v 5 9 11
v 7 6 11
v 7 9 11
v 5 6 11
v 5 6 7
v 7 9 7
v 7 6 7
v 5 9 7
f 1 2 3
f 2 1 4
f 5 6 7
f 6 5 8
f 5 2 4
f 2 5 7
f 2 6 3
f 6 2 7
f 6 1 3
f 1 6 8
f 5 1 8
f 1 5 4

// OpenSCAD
// file: ../openscad/transform.scad
// File: transform.scad
//   Lightweight, domain-independent transform convenience modules.
//
// FileSummary: Small plain-OpenSCAD move/rotate wrappers with an xf_ prefix.
//
// These helpers intentionally remain thin wrappers around native OpenSCAD
// translate() and rotate().  They improve readability without introducing a
// geometry framework dependency such as BOSL2.



// Function: xf_create()
// Synopsis: Creates a reusable position/rotation transform object.
// Arguments:
//   pos_mm = Translation vector in millimetres.
//   rot_deg = Euler rotation vector in degrees.
function xf_create(
    pos_mm = [0, 0, 0],
    rot_deg = [0, 0, 0]
) =
    assert(is_list(pos_mm) && len(pos_mm) == 3,
        "xf_create pos_mm must contain three values")
    assert(is_list(rot_deg) && len(rot_deg) == 3,
        "xf_create rot_deg must contain three values")
    object(
        kind = "pose",
        pos_mm = pos_mm,
        rot_deg = rot_deg
    );



// Function: xf_frame_create()
// Synopsis: Creates an orthogonal coordinate-frame transform object.
// Description:
//   Supply any two orthogonal destination axes. The missing third axis is
//   derived to preserve a right-handed coordinate system. Supplying all three
//   axes is allowed when they are mutually orthogonal and right-handed.
// Arguments:
//   pos_mm = Destination origin in millimetres.
//   x_axis = Destination direction of local +X.
//   y_axis = Destination direction of local +Y.
//   z_axis = Destination direction of local +Z.
function xf_frame_create(
    pos_mm = [0, 0, 0],
    x_axis = undef,
    y_axis = undef,
    z_axis = undef
) =
    assert(is_list(pos_mm) && len(pos_mm) == 3,
        "xf_frame_create pos_mm must contain three values")
    assert(_xf_defined_axis_count(x_axis, y_axis, z_axis) >= 2,
        "xf_frame_create requires at least two axes")
    assert(_xf_axis_is_valid(x_axis),
        "xf_frame_create x_axis must be undef or a non-zero vec3")
    assert(_xf_axis_is_valid(y_axis),
        "xf_frame_create y_axis must be undef or a non-zero vec3")
    assert(_xf_axis_is_valid(z_axis),
        "xf_frame_create z_axis must be undef or a non-zero vec3")
    let(
        _x = is_undef(x_axis) ? undef : _xf_unit(x_axis),
        _y = is_undef(y_axis) ? undef : _xf_unit(y_axis),
        _z = is_undef(z_axis) ? undef : _xf_unit(z_axis),
        _resolved_x =
            is_undef(_x)
                ? _xf_unit(cross(_y, _z))
                : _x,
        _resolved_y =
            is_undef(_y)
                ? _xf_unit(cross(_z, _x))
                : _y,
        _resolved_z =
            is_undef(_z)
                ? _xf_unit(cross(_x, _y))
                : _z
    )
    assert(_xf_axes_are_orthogonal(
        _resolved_x,
        _resolved_y,
        _resolved_z
    ), "xf_frame_create axes must be mutually orthogonal")
    assert(
        _xf_dot(
            _xf_unit(cross(_resolved_x, _resolved_y)),
            _resolved_z
        ) > 0.999999,
        "xf_frame_create axes must form a right-handed frame"
    )
    object(
        kind = "frame",
        pos_mm = pos_mm,
        x_axis = _resolved_x,
        y_axis = _resolved_y,
        z_axis = _resolved_z
    );


// Module: xf_frame()
// Synopsis: Remaps child geometry into an orthogonal destination frame.
module xf_frame(
    pos_mm = [0, 0, 0],
    x_axis = undef,
    y_axis = undef,
    z_axis = undef
) {
    xf_apply(
        xf_frame_create(
            pos_mm = pos_mm,
            x_axis = x_axis,
            y_axis = y_axis,
            z_axis = z_axis
        )
    )
        children();
}


// Function: xf_pos_mm()
// Synopsis: Returns the translation vector from a transform object.
function xf_pos_mm(obj) =
    obj.pos_mm;


// Function: xf_rot_deg()
// Synopsis: Returns the Euler rotation vector from a transform object.
function xf_rot_deg(obj) =
    obj.rot_deg;


// Module: xf_apply()
// Synopsis: Applies a transform object to child geometry.
// Arguments:
//   obj = Transform object created by xf_create().
module xf_apply(obj) {
    if (obj.kind == "pose")
        translate(xf_pos_mm(obj))
            rotate(xf_rot_deg(obj))
                children();
    else if (obj.kind == "frame")
        multmatrix(_xf_frame_matrix(obj))
            children();
    else
        assert(false, str("Unsupported transform kind: ", obj.kind));
}


// Module: xf_move()
// Usage:
//   xf_move([10, 0, 5])
//       children();
// Description:
//   Moves child geometry by the supplied [X, Y, Z] vector.
// Arguments:
//   v = Translation vector in millimetres.
module xf_move(v) {
    translate(v)
        children();
}


// Module: xf_xmove()
// Usage:
//   xf_xmove(10)
//       children();
// Description:
//   Moves child geometry along X.
// Arguments:
//   distance = Translation distance in millimetres.
module xf_xmove(distance) {
    translate([distance, 0, 0])
        children();
}


// Module: xf_ymove()
// Usage:
//   xf_ymove(10)
//       children();
// Description:
//   Moves child geometry along Y.
// Arguments:
//   distance = Translation distance in millimetres.
module xf_ymove(distance) {
    translate([0, distance, 0])
        children();
}


// Module: xf_zmove()
// Usage:
//   xf_zmove(10)
//       children();
// Description:
//   Moves child geometry along Z.
// Arguments:
//   distance = Translation distance in millimetres.
module xf_zmove(distance) {
    translate([0, 0, distance])
        children();
}


// Module: xf_rot()
// Usage:
//   xf_rot([90, 0, 45])
//       children();
// Description:
//   Rotates child geometry by the supplied [X, Y, Z] Euler-angle vector.
// Arguments:
//   angles = Rotation angles in degrees.
module xf_rot(angles) {
    rotate(angles)
        children();
}


// Module: xf_xrot()
// Usage:
//   xf_xrot(90)
//       children();
// Description:
//   Rotates child geometry around X.
// Arguments:
//   angle = Rotation angle in degrees.
module xf_xrot(angle) {
    rotate([angle, 0, 0])
        children();
}


// Module: xf_yrot()
// Usage:
//   xf_yrot(90)
//       children();
// Description:
//   Rotates child geometry around Y.
// Arguments:
//   angle = Rotation angle in degrees.
module xf_yrot(angle) {
    rotate([0, angle, 0])
        children();
}


// Module: xf_zrot()
// Usage:
//   xf_zrot(90)
//       children();
// Description:
//   Rotates child geometry around Z.
// Arguments:
//   angle = Rotation angle in degrees.
module xf_zrot(angle) {
    rotate([0, 0, angle])
        children();
}


function _xf_defined_axis_count(x_axis, y_axis, z_axis) =
    (is_undef(x_axis) ? 0 : 1)
    + (is_undef(y_axis) ? 0 : 1)
    + (is_undef(z_axis) ? 0 : 1);


function _xf_axis_is_valid(axis) =
    is_undef(axis)
    || (
        is_list(axis)
        && len(axis) == 3
        && _xf_norm(axis) > 0
    );


function _xf_dot(a, b) =
    a[0] * b[0]
    + a[1] * b[1]
    + a[2] * b[2];


function _xf_norm(v) =
    sqrt(_xf_dot(v, v));


function _xf_unit(v) =
    v / _xf_norm(v);


function _xf_axes_are_orthogonal(x_axis, y_axis, z_axis) =
    abs(_xf_dot(x_axis, y_axis)) < 0.000001
    && abs(_xf_dot(x_axis, z_axis)) < 0.000001
    && abs(_xf_dot(y_axis, z_axis)) < 0.000001;


function _xf_frame_matrix(obj) =
    [
        [
            obj.x_axis[0],
            obj.y_axis[0],
            obj.z_axis[0],
            obj.pos_mm[0]
        ],
        [
            obj.x_axis[1],
            obj.y_axis[1],
            obj.z_axis[1],
            obj.pos_mm[1]
        ],
        [
            obj.x_axis[2],
            obj.y_axis[2],
            obj.z_axis[2],
            obj.pos_mm[2]
        ],
        [0, 0, 0, 1]
    ];
// main file
use <../openscad/transform.scad>

test_transform = "move"; // [move,xmove,ymove,zmove,rot,xrot,yrot,zrot,object,frame,frame-object]

module fixture() {
    cube([2, 3, 4]);
}

if (test_transform == "move")
    xf_move([5, 6, 7])
        fixture();
else if (test_transform == "xmove")
    xf_xmove(5)
        fixture();
else if (test_transform == "ymove")
    xf_ymove(6)
        fixture();
else if (test_transform == "zmove")
    xf_zmove(7)
        fixture();
else if (test_transform == "rot")
    xf_rot([15, 25, 35])
        fixture();
else if (test_transform == "xrot")
    xf_xrot(30)
        fixture();
else if (test_transform == "yrot")
    xf_yrot(40)
        fixture();
else if (test_transform == "zrot")
    xf_zrot(50)
        fixture();
else if (test_transform == "object")
    xf_apply(
        xf_create(
            pos_mm = [5, 6, 7],
            rot_deg = [15, 25, 35]
        )
    )
        fixture();
else if (test_transform == "frame")
    xf_frame(
        pos_mm = [5, 6, 7],
        x_axis = [0, 1, 0],
        y_axis = [0, 0, 1]
    )
        fixture();
else if (test_transform == "frame-object")
    xf_apply(
        xf_frame_create(
            pos_mm = [5, 6, 7],
            x_axis = [0, 1, 0],
            y_axis = [0, 0, 1]
        )
    )
        fixture();
